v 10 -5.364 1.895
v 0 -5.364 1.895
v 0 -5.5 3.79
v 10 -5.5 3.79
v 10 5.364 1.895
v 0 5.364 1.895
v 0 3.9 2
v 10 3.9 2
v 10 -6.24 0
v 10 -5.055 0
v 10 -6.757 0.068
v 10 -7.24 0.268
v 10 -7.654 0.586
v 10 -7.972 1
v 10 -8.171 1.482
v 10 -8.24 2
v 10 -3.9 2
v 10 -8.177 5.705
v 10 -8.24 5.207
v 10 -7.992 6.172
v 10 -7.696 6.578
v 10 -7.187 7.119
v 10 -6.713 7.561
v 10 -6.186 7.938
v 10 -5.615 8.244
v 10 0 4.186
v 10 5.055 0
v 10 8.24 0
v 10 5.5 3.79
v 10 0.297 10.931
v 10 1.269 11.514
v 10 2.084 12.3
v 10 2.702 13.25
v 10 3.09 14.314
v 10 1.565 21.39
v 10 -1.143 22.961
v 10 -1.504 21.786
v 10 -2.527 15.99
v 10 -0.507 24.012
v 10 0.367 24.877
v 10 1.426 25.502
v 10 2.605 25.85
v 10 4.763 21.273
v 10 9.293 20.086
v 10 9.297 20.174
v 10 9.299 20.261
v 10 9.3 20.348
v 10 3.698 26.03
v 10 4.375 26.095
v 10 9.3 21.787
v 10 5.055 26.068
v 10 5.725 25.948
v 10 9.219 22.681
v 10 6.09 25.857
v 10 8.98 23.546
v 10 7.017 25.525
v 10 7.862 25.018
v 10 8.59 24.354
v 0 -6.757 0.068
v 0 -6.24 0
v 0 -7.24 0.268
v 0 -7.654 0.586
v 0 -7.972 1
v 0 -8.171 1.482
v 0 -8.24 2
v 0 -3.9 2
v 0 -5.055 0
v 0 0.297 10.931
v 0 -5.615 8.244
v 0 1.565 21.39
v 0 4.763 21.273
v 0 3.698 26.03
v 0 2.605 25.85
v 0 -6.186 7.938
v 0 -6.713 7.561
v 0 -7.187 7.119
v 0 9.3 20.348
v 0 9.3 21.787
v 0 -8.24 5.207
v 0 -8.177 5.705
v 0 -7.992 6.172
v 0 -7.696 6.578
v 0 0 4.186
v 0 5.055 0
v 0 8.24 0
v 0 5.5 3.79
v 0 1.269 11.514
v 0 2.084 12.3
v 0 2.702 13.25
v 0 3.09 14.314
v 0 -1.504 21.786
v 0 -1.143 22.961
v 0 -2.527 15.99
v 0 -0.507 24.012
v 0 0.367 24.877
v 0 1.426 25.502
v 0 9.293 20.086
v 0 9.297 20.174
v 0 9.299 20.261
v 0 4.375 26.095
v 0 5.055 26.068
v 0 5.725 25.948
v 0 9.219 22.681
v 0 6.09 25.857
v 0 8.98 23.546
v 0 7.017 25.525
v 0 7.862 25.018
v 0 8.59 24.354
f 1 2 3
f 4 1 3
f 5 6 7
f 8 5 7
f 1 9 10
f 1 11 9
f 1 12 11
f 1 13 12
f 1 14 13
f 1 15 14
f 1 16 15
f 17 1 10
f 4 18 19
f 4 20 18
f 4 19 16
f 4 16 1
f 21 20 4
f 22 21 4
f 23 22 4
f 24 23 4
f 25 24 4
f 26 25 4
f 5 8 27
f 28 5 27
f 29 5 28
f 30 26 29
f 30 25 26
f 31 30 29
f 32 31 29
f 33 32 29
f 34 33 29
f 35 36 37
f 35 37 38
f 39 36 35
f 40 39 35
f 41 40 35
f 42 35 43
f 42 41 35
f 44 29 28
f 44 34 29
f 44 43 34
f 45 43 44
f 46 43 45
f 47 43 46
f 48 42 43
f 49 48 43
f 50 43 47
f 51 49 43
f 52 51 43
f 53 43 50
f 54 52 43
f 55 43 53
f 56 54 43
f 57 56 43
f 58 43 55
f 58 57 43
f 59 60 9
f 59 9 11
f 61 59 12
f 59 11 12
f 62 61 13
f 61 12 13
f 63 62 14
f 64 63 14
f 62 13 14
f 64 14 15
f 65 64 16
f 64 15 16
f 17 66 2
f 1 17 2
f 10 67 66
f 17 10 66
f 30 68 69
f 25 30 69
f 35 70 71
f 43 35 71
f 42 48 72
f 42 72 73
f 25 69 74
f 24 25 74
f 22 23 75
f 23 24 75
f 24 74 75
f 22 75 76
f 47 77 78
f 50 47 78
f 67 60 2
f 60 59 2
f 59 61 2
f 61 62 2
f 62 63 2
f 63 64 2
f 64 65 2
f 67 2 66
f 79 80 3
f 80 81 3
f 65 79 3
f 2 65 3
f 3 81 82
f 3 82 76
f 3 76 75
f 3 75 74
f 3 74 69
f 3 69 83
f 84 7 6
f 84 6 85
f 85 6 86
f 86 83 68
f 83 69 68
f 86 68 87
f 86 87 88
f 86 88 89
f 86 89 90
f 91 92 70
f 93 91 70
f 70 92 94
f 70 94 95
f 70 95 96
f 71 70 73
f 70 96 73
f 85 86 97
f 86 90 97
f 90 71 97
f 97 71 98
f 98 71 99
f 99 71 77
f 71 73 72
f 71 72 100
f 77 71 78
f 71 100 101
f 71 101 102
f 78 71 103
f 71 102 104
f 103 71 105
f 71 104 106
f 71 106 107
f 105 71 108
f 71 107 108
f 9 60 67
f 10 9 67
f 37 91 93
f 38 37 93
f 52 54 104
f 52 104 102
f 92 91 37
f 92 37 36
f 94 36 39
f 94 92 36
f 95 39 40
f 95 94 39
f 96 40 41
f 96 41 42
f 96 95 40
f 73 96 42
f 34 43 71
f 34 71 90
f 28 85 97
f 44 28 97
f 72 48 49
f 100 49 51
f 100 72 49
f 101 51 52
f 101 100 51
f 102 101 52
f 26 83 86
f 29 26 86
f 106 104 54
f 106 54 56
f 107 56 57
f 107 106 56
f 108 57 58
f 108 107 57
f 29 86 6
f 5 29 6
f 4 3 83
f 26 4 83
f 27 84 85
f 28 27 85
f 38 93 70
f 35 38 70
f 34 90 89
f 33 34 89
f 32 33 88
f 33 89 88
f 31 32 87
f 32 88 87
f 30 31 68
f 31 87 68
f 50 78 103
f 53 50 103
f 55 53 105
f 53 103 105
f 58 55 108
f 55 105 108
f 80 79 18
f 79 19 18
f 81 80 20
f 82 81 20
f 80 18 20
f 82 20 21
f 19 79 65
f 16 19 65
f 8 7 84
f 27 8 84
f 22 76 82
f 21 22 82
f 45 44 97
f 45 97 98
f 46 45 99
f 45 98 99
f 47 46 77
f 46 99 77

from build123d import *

# Parameters (mm, degrees)
F2_DEPTH     = 10
F3_T1_DEPTH  = 10
F3_T3_DEPTH  = 10.6551499426
F3_T5_DEPTH  = 18.2363272352
F3_T7_DEPTH  = 18.9745597366
F3_T9_DEPTH  = 15.1812109951
F3_T11_DEPTH = 27.7044164166
F3_T13_DEPTH = 14.9256552594
F4_R         = 2


# Not quite as in the source:
# - a fillet or chamfer that OpenCascade refuses, or shapes differently, is made with other operations: its cross-section is extruded or revolved along the edge and cut away or added


with BuildPart() as f2:
    # F1 (on Right) → F2 (new body)
    with BuildSketch(Plane.YZ):
        Polygon((-5.0547005384, 0), (-3.9, 2), (-5.3636236598, 1.894673786), (-5.5, 3.7897731222), (0, 4.18556761), (5.5, 3.7897731222), (5.3636236598, 1.894673786), (3.9, 2), (5.0547005384, 0), (8.2396483049, 0), (9.3, 20.2171942833), (9.3, 23.4340857714), (7.8309578478, 25.4216119647), (4.720045685, 26.1993408203), (-0.8888025768, 25.2726981416), (-2.5269729085, 15.9901147708), (1.5650866553, 21.3901147708), (4.7629482978, 21.2731493252), (2.5189220905, 11.9409952313), (-6.5113636665, 7.8363195062), (-8.2396483049, 6), (-8.2396483049, 0), align=None)
    extrude(amount=F2_DEPTH)

    # F3: fillet of radius 5 on 7 edges, made by hand

    # F3_s2 → F3_t1 (join)
    with BuildSketch(Plane.YZ):
        with BuildLine():
            ThreePointArc((3.0895210417, 14.313925334), (2.0840852214, 12.299936757), (0.2971092897, 10.9310802281))
            Line((0.2971092897, 10.9310802281), (2.5189220905, 11.9409952313))
            Line((2.5189220905, 11.9409952313), (3.0895210417, 14.313925334))
        make_face()
    extrude(amount=F3_T1_DEPTH)

    # F3_s4 → F3_t3 (cut)
    with BuildSketch(Plane.YZ.offset(-0.3275749713)):
        with BuildLine():
            ThreePointArc((9.2931371699, 20.0863441421), (9.298283998, 20.2172392528), (9.3, 20.3482242718))
            Line((9.3, 20.3482242718), (9.3, 20.2171942833))
            Line((9.3, 20.2171942833), (9.2931371699, 20.0863441421))
        make_face()
    extrude(amount=F3_T3_DEPTH, mode=Mode.SUBTRACT)

    # F3_s6 → F3_t5 (cut)
    with BuildSketch(Plane.YZ.offset(-4.1181636176)):
        with BuildLine():
            ThreePointArc((9.3, 21.7868203244), (9.0489155839, 23.3513652349), (8.3208796893, 24.7587770072))
            Line((8.3208796893, 24.7587770072), (9.3, 23.4340857714))
            Line((9.3, 23.4340857714), (9.3, 21.7868203244))
        make_face()
    extrude(amount=F3_T5_DEPTH, mode=Mode.SUBTRACT)

    # F3_s8 → F3_t7 (cut)
    with BuildSketch(Plane.YZ.offset(-4.4872798683)):
        with BuildLine():
            ThreePointArc((6.089637591, 25.856942485), (7.6572398301, 25.1619533788), (8.8978379592, 23.9781869661))
            Line((8.8978379592, 23.9781869661), (7.8309578478, 25.4216119647))
            Line((7.8309578478, 25.4216119647), (6.089637591, 25.856942485))
        make_face()
    extrude(amount=F3_T7_DEPTH, mode=Mode.SUBTRACT)

    # F3_s10 → F3_t9 (cut)
    with BuildSketch(Plane.YZ.offset(-2.5906054975)):
        with BuildLine():
            ThreePointArc((3.6976623422, 26.0304319828), (4.715730589, 26.0931776147), (5.7253482208, 25.948014923))
            Line((5.7253482208, 25.948014923), (4.720045685, 26.1993408203))
            Line((4.720045685, 26.1993408203), (3.6976623422, 26.0304319828))
        make_face()
    extrude(amount=F3_T9_DEPTH, mode=Mode.SUBTRACT)

    # F3_s12 → F3_t11 (cut)
    with BuildSketch(Plane.YZ.offset(-8.8522082083)):
        with BuildLine():
            ThreePointArc((-1.5041807088, 21.7856988327), (-0.0963977073, 24.4715707073), (2.6047244105, 25.8498667607))
            Line((2.6047244105, 25.8498667607), (-0.8888025768, 25.2726981416))
            Line((-0.8888025768, 25.2726981416), (-1.5041807088, 21.7856988327))
        make_face()
    extrude(amount=F3_T11_DEPTH, mode=Mode.SUBTRACT)

    # F3_s14 → F3_t13 (cut)
    with BuildSketch(Plane.YZ.offset(-2.4628276297)):
        with BuildLine():
            ThreePointArc((-5.6145333952, 8.2439696673), (-6.4554211776, 7.7581509396), (-7.1865343837, 7.1189439476))
            Line((-7.1865343837, 7.1189439476), (-6.5113636665, 7.8363195062))
            Line((-6.5113636665, 7.8363195062), (-5.6145333952, 8.2439696673))
        make_face()
    extrude(amount=F3_T13_DEPTH, mode=Mode.SUBTRACT)

    # F4
    f4_edges = [f2.edges().sort_by_distance(p)[0] for p in [
        (5, -8.239648, 0),
        (5, -8.239648, 6),
    ]]
    fillet(f4_edges, radius=F4_R)


solid = f2.part
